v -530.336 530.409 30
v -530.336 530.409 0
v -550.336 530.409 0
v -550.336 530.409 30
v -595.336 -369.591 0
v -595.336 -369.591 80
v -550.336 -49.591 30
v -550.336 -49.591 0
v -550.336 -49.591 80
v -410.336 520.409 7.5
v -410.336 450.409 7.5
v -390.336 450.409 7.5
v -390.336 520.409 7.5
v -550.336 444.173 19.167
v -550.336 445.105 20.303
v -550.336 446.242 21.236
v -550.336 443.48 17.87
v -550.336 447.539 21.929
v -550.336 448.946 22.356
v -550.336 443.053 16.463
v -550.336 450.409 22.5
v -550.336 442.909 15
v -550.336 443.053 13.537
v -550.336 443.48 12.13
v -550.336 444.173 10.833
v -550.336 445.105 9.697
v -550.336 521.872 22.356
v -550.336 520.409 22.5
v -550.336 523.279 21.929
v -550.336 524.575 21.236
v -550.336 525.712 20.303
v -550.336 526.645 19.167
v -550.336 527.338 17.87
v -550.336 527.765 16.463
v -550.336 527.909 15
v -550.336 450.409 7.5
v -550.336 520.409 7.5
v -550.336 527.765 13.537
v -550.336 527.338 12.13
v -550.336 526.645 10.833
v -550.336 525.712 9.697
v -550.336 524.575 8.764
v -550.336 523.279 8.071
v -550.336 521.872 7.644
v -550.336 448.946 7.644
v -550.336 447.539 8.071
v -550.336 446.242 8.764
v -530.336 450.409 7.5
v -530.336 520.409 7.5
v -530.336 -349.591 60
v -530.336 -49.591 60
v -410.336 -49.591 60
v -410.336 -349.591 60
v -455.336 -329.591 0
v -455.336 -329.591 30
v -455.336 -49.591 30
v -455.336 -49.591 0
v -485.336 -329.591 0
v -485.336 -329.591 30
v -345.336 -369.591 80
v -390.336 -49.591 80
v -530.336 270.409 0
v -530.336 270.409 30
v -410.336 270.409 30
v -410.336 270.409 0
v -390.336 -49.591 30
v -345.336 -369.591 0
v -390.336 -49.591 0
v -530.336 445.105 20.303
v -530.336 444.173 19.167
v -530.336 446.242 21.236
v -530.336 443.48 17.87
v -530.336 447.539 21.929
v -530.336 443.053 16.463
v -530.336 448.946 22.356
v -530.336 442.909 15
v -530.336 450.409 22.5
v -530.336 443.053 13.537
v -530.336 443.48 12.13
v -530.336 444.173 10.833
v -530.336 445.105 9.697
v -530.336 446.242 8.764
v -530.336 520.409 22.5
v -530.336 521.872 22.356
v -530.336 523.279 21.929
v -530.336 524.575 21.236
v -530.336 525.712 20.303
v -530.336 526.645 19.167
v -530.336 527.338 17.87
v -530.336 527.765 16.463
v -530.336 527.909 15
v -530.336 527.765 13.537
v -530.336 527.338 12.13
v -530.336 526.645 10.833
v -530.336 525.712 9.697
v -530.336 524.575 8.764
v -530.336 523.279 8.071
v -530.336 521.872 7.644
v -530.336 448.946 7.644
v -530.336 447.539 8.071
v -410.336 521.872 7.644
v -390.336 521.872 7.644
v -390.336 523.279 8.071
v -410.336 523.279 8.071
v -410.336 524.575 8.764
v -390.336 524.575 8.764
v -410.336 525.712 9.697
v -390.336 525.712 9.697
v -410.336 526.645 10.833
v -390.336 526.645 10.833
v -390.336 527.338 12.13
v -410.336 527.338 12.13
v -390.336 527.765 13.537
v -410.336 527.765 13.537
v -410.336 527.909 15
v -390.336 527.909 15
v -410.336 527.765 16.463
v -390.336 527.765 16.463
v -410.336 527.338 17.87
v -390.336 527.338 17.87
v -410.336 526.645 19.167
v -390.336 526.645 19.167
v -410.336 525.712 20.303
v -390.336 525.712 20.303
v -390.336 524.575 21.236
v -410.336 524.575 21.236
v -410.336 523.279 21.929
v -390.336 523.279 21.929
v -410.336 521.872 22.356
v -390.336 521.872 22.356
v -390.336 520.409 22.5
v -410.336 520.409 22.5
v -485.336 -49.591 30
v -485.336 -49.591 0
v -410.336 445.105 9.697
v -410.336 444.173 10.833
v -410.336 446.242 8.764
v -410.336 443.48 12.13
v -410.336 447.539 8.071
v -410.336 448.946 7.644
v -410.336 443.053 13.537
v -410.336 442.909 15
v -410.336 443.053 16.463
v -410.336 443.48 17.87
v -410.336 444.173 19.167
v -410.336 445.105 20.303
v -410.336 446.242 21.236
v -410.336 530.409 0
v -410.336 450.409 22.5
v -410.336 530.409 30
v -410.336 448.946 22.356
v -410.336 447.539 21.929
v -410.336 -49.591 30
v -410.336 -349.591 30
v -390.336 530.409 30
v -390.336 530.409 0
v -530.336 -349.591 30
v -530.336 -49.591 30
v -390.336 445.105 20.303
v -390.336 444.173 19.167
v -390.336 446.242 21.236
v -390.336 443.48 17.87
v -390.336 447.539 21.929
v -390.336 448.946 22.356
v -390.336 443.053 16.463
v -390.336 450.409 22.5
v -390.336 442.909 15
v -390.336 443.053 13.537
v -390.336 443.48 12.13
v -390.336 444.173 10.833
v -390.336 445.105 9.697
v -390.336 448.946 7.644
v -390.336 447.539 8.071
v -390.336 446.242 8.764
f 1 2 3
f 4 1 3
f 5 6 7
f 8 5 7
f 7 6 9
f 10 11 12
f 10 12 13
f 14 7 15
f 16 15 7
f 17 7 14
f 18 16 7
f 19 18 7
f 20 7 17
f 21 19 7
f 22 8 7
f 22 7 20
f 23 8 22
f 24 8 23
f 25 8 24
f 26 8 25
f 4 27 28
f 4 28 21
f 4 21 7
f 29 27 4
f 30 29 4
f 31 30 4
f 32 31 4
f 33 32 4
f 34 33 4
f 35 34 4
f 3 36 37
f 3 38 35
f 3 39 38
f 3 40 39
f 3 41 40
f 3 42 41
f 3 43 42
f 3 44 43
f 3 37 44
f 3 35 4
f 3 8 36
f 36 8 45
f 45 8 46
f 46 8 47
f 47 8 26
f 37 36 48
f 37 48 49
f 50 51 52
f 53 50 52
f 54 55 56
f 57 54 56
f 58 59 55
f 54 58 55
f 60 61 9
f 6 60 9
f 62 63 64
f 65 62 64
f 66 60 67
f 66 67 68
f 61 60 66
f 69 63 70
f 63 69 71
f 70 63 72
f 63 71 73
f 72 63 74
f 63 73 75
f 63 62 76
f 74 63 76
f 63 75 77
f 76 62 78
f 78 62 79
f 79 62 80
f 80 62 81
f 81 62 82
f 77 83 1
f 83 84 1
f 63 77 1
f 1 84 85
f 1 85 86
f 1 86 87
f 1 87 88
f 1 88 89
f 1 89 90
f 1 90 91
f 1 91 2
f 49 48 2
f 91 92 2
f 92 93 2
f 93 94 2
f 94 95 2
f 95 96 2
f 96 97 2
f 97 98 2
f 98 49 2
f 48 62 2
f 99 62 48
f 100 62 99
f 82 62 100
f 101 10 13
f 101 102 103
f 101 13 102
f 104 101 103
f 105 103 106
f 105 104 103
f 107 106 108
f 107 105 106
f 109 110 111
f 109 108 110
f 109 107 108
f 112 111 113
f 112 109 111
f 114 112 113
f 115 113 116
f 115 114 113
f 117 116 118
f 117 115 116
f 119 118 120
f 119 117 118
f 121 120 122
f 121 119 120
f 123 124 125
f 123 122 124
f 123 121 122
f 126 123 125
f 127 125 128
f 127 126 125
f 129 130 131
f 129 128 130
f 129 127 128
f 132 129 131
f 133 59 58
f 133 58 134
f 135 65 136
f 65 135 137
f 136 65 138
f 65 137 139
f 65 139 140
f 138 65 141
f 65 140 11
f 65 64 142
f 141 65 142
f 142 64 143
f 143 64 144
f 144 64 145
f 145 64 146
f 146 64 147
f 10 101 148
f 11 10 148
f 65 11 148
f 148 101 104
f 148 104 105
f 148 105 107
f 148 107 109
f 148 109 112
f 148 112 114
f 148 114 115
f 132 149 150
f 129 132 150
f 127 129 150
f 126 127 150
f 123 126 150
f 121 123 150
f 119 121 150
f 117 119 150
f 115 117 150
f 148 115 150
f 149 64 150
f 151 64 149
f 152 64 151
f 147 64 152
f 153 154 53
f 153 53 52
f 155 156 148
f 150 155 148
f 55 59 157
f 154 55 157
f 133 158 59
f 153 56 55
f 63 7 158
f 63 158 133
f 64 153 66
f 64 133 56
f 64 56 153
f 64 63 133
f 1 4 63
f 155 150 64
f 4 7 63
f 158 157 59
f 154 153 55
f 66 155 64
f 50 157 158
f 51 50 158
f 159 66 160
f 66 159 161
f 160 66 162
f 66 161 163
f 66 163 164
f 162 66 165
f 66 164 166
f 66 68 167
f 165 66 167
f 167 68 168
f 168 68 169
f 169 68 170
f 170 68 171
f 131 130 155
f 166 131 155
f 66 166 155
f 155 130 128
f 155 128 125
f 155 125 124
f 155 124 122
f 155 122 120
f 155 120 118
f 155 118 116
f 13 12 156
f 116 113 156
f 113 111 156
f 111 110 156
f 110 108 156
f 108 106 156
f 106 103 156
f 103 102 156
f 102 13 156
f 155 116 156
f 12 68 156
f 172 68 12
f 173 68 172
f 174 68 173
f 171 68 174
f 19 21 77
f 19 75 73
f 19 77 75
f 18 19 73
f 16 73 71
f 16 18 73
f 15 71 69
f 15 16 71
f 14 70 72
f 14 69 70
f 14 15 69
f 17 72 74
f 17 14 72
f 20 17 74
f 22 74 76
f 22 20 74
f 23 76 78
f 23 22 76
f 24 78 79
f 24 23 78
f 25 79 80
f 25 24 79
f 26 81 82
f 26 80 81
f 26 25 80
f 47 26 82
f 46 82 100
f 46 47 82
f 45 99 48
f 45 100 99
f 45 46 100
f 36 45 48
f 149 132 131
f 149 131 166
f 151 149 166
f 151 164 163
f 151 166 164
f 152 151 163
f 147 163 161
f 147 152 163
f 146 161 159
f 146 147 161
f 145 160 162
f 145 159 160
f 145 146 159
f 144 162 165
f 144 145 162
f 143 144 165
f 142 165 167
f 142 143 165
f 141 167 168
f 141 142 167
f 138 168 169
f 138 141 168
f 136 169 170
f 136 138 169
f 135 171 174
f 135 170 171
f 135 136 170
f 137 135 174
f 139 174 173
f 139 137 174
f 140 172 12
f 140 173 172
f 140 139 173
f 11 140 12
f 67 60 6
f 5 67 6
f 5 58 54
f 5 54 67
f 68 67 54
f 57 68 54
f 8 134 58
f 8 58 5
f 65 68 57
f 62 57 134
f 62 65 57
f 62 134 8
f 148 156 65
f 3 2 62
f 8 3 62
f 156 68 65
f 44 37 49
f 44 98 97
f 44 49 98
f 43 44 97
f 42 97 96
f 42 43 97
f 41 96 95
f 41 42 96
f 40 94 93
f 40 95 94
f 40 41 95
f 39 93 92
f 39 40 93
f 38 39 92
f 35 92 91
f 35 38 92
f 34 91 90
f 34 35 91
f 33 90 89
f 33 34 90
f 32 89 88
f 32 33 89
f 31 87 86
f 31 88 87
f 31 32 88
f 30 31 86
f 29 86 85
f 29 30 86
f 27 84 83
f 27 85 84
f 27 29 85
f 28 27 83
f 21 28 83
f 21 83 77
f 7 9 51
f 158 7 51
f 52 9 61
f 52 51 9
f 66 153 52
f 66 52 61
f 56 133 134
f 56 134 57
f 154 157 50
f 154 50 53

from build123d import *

# Parameters (mm, degrees)
EXTRUDE_1_DEPTH          = 30
SKETCH_5_W               = 160
SKETCH_5_H               = 320
EXTRUDE_4_DEPTH          = 50
SKETCH_6_W               = 120
SKETCH_6_H               = 300
CUT_EXTRUDE_1_DEPTH      = 30
SKETCH_7_W               = 30
SKETCH_7_H               = 280
CUT_EXTRUDE_2_DEPTH      = 766.965155529
CUT_EXTRUDE_4_DEPTH      = 555.376568193
CUT_EXTRUDE_4_DEPTH_BACK = 555.376568193
SKETCH_10_W              = 120
SKETCH_10_H              = 180
CUT_EXTRUDE_5_DEPTH      = 766.965155601
EXTRUDE_5_DEPTH          = 80


with BuildPart() as part:
    # 草图1 → 凸台-拉伸1 (new body)
    with BuildSketch(Plane.XY):
        with BuildLine():
            Line((-550.33557047, 530.40869088), (-550.33557047, -369.59130912))
            Line((-550.33557047, -369.59130912), (-390.33557047, -369.59130912))
            Line((-390.33557047, -369.59130912), (-390.33557047, 530.40869088))
            Line((-390.33557047, 530.40869088), (-410.33557047, 530.40869088))
            Line((-410.33557047, 530.40869088), (-410.33557047, 450.40869088))
            ThreePointArc((-410.33557047, 450.40869088), (-470.33557047, 390.40869088), (-530.33557047, 450.40869088))
            Line((-530.33557047, 450.40869088), (-530.33557047, 530.40869088))
            Line((-530.33557047, 530.40869088), (-550.33557047, 530.40869088))
        make_face()
    extrude(amount=EXTRUDE_1_DEPTH)

    # 草图5 → 凸台-拉伸4 (add)
    with BuildSketch(Plane.XY.offset(30)):
        with Locations((-470.33557047, -209.59130912)):
            Rectangle(SKETCH_5_W, SKETCH_5_H)
    extrude(amount=EXTRUDE_4_DEPTH)

    # 草图6 → 切除-拉伸1 (cut)
    with BuildSketch(Plane.XY.offset(30)):
        with Locations((-470.33557047, -199.59130912)):
            Rectangle(SKETCH_6_W, SKETCH_6_H)
    extrude(amount=CUT_EXTRUDE_1_DEPTH, mode=Mode.SUBTRACT)

    # 草图7 → 切除-拉伸2 (cut, through all)
    with BuildSketch(Plane.XY.offset(30)):
        with Locations((-470.33557047, -189.59130912)):
            Rectangle(SKETCH_7_W, SKETCH_7_H)
    extrude(amount=-CUT_EXTRUDE_2_DEPTH, mode=Mode.SUBTRACT)

    # 草图9 → 切除-拉伸4 (cut, two sides: drawn at the far end of the back side and taken through both)
    with BuildSketch(Plane(origin=(-530.33557047, 0, 0), x_dir=(0, 0, -1), z_dir=(1, 0, 0)).offset(-CUT_EXTRUDE_4_DEPTH_BACK)):
        with BuildLine():
            Line((-7.5, 450.40869088), (-7.5, 520.40869088))
            ThreePointArc((-7.5, 520.40869088), (-15, 527.90869088), (-22.5, 520.40869088))
            Line((-22.5, 520.40869088), (-22.5, 450.40869088))
            ThreePointArc((-22.5, 450.40869088), (-15, 442.90869088), (-7.5, 450.40869088))
        make_face()
    extrude(amount=CUT_EXTRUDE_4_DEPTH + CUT_EXTRUDE_4_DEPTH_BACK, mode=Mode.SUBTRACT)

    # 草图10 → 切除-拉伸5 (cut, through all)
    with BuildSketch(Plane.XY.offset(30)):
        with Locations((-470.33557047, 360.40869088)):
            Rectangle(SKETCH_10_W, SKETCH_10_H)
    extrude(amount=-CUT_EXTRUDE_5_DEPTH, mode=Mode.SUBTRACT)

    # 草图11 → 凸台-拉伸5 (add)
    with BuildSketch(Plane.XY.offset(80)):
        Polygon((-550.33557047, -369.59130912), (-595.33557047, -369.59130912), (-550.33557047, -49.59130912), align=None)
        Polygon((-390.33557047, -369.59130912), (-345.33557047, -369.59130912), (-390.33557047, -49.59130912), align=None)
    extrude(amount=-EXTRUDE_5_DEPTH)


solid = part.part
